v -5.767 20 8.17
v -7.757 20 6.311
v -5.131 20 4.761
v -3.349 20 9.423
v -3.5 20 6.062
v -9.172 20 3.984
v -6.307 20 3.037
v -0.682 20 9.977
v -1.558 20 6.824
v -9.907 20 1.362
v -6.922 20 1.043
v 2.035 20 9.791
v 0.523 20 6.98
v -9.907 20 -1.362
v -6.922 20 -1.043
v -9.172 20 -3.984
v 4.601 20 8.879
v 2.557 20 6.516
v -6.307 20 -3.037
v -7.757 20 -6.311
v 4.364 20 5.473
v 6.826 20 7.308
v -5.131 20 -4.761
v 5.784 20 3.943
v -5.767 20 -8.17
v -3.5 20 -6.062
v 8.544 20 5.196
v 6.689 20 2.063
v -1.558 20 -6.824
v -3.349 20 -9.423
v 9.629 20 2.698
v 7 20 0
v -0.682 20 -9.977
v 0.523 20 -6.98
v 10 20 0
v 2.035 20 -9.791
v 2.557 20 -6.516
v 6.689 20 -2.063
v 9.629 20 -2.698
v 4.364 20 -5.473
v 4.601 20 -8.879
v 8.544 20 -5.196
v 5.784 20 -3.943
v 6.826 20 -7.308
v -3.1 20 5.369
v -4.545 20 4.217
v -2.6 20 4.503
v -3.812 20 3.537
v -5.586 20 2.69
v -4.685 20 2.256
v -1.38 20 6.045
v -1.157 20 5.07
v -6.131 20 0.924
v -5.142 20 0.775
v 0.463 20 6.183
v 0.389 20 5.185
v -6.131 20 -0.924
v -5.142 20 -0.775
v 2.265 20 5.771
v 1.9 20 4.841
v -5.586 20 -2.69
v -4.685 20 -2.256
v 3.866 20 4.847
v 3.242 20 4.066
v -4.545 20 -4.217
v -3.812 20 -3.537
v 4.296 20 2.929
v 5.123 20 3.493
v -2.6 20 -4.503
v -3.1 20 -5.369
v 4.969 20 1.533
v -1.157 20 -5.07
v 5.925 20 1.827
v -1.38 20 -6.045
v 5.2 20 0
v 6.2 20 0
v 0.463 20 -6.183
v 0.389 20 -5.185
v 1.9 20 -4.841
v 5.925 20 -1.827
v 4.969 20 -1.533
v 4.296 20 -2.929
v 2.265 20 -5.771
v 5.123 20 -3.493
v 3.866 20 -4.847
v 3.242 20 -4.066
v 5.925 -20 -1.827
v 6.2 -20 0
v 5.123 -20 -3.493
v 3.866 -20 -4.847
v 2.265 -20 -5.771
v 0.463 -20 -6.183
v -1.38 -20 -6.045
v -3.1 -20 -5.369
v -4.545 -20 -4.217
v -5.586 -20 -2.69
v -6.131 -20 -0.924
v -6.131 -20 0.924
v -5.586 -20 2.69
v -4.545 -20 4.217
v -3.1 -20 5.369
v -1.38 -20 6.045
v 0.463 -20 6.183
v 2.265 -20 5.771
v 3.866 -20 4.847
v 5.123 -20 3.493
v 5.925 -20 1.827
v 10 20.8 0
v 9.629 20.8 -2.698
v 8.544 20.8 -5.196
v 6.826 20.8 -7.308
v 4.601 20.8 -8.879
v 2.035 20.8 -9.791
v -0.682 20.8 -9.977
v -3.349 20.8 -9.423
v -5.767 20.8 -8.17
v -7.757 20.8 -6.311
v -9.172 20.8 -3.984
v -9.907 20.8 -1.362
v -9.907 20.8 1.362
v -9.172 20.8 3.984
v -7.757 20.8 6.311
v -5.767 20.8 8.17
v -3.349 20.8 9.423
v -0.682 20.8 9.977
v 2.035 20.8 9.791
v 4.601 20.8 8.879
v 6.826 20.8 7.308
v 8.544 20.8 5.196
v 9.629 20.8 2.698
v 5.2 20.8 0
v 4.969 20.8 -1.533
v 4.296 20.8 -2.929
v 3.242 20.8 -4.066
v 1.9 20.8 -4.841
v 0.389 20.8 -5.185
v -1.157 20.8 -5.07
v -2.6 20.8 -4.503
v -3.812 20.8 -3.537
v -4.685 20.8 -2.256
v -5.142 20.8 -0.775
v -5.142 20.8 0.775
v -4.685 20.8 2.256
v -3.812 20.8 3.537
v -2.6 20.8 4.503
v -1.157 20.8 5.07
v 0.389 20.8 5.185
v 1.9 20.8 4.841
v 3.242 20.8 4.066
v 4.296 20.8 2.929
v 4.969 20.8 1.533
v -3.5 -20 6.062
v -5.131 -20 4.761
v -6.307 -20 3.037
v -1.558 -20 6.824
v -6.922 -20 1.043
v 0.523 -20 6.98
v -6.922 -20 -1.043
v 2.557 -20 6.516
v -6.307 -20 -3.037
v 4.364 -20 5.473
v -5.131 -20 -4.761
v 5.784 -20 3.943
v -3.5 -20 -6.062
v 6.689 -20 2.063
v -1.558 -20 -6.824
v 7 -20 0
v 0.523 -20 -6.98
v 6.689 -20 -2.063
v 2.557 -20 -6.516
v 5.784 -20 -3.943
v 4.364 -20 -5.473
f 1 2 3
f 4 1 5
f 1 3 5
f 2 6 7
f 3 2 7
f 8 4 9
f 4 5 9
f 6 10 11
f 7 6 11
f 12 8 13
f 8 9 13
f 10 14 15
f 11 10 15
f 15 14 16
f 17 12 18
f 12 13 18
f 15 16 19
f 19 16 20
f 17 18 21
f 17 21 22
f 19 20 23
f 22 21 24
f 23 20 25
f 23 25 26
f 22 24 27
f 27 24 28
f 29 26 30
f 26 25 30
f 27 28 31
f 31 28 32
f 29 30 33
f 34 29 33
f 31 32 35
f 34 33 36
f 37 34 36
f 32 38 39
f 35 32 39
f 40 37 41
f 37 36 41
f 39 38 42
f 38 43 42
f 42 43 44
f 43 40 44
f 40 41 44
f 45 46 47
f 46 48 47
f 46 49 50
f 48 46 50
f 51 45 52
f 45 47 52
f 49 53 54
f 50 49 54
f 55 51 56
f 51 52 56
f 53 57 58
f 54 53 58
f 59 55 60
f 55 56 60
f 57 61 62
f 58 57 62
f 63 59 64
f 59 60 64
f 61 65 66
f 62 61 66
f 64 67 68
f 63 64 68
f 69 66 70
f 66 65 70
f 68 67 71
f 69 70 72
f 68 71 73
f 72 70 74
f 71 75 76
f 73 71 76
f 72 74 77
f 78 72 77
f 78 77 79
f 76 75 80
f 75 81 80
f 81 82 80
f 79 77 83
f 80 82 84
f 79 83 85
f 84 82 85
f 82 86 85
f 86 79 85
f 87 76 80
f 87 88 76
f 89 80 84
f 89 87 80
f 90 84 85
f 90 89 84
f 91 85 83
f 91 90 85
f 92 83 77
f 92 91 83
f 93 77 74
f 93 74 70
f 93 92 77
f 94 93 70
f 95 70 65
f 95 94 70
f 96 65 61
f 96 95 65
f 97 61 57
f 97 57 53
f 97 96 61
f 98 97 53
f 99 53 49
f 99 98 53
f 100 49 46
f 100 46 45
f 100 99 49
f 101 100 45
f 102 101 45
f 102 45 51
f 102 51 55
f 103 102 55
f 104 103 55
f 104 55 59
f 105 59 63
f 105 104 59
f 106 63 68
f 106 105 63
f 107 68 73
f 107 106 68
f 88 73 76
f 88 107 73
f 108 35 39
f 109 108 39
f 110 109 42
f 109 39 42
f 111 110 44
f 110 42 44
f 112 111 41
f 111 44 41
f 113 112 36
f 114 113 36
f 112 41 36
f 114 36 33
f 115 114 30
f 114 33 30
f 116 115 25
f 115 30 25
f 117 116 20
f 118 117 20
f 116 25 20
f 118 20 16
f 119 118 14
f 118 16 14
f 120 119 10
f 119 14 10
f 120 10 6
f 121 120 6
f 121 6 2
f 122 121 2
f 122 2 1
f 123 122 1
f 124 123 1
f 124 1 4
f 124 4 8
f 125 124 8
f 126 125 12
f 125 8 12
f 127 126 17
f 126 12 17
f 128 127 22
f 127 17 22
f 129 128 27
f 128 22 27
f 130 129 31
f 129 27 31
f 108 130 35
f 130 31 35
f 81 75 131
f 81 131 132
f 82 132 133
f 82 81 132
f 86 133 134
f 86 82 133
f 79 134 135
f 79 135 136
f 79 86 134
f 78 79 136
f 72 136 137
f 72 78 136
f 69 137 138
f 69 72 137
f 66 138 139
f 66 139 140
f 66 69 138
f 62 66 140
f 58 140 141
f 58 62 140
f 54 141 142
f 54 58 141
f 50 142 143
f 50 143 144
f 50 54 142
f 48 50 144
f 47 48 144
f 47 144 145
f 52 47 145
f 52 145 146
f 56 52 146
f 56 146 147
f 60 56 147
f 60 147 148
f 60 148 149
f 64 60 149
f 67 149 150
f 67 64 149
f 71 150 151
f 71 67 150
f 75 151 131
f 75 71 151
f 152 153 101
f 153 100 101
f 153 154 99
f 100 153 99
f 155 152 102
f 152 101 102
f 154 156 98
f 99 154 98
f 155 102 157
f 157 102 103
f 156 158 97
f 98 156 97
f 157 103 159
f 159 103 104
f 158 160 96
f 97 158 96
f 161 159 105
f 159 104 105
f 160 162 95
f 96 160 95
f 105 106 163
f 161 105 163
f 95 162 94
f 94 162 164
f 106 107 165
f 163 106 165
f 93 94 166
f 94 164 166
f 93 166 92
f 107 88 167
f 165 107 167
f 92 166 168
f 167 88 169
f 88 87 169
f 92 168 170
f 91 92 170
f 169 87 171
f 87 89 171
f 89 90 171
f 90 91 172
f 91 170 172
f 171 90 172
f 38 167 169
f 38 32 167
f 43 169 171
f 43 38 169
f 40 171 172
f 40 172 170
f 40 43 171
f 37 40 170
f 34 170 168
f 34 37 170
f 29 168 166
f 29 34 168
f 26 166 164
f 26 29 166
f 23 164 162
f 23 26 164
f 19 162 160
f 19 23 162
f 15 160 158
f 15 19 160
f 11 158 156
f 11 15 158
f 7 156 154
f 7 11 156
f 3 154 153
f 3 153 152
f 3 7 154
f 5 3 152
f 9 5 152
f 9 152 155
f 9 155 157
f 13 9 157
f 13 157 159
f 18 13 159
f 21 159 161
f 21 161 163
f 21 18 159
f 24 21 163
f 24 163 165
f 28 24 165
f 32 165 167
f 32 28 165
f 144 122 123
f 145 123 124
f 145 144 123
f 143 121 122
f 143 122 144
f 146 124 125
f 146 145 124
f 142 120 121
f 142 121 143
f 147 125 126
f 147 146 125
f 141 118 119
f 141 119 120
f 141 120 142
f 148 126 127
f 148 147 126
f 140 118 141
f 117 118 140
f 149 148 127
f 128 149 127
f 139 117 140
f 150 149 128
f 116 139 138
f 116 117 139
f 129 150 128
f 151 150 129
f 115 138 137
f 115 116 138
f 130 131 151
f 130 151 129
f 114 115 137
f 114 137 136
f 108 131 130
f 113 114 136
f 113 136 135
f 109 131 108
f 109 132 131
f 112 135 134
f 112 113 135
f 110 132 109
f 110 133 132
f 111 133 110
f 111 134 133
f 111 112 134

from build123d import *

# Parameters (mm, degrees)
SKETCH1_R           = 7
SKETCH1_R_2         = 6.2
BOSS_EXTRUDE1_DEPTH = 20
SKETCH4_R           = 10
SKETCH4_R_2         = 5.2
BOSS_EXTRUDE3_DEPTH = 0.8


with BuildPart() as part:
    # Sketch1 → Boss-Extrude1 (new body, symmetric)
    with BuildSketch(Plane(origin=(0, 0, 0), x_dir=(1, 0, 0), z_dir=(0, 1, 0))):
        Circle(SKETCH1_R)
        Circle(SKETCH1_R_2, mode=Mode.SUBTRACT)
    extrude(amount=BOSS_EXTRUDE1_DEPTH, both=True)

    # Sketch4 → Boss-Extrude3 (add)
    with BuildSketch(Plane(origin=(0, 20, 0), x_dir=(1, 0, 0), z_dir=(0, 1, 0))):
        Circle(SKETCH4_R)
        Circle(SKETCH4_R_2, mode=Mode.SUBTRACT)
    extrude(amount=BOSS_EXTRUDE3_DEPTH)


solid = part.part
